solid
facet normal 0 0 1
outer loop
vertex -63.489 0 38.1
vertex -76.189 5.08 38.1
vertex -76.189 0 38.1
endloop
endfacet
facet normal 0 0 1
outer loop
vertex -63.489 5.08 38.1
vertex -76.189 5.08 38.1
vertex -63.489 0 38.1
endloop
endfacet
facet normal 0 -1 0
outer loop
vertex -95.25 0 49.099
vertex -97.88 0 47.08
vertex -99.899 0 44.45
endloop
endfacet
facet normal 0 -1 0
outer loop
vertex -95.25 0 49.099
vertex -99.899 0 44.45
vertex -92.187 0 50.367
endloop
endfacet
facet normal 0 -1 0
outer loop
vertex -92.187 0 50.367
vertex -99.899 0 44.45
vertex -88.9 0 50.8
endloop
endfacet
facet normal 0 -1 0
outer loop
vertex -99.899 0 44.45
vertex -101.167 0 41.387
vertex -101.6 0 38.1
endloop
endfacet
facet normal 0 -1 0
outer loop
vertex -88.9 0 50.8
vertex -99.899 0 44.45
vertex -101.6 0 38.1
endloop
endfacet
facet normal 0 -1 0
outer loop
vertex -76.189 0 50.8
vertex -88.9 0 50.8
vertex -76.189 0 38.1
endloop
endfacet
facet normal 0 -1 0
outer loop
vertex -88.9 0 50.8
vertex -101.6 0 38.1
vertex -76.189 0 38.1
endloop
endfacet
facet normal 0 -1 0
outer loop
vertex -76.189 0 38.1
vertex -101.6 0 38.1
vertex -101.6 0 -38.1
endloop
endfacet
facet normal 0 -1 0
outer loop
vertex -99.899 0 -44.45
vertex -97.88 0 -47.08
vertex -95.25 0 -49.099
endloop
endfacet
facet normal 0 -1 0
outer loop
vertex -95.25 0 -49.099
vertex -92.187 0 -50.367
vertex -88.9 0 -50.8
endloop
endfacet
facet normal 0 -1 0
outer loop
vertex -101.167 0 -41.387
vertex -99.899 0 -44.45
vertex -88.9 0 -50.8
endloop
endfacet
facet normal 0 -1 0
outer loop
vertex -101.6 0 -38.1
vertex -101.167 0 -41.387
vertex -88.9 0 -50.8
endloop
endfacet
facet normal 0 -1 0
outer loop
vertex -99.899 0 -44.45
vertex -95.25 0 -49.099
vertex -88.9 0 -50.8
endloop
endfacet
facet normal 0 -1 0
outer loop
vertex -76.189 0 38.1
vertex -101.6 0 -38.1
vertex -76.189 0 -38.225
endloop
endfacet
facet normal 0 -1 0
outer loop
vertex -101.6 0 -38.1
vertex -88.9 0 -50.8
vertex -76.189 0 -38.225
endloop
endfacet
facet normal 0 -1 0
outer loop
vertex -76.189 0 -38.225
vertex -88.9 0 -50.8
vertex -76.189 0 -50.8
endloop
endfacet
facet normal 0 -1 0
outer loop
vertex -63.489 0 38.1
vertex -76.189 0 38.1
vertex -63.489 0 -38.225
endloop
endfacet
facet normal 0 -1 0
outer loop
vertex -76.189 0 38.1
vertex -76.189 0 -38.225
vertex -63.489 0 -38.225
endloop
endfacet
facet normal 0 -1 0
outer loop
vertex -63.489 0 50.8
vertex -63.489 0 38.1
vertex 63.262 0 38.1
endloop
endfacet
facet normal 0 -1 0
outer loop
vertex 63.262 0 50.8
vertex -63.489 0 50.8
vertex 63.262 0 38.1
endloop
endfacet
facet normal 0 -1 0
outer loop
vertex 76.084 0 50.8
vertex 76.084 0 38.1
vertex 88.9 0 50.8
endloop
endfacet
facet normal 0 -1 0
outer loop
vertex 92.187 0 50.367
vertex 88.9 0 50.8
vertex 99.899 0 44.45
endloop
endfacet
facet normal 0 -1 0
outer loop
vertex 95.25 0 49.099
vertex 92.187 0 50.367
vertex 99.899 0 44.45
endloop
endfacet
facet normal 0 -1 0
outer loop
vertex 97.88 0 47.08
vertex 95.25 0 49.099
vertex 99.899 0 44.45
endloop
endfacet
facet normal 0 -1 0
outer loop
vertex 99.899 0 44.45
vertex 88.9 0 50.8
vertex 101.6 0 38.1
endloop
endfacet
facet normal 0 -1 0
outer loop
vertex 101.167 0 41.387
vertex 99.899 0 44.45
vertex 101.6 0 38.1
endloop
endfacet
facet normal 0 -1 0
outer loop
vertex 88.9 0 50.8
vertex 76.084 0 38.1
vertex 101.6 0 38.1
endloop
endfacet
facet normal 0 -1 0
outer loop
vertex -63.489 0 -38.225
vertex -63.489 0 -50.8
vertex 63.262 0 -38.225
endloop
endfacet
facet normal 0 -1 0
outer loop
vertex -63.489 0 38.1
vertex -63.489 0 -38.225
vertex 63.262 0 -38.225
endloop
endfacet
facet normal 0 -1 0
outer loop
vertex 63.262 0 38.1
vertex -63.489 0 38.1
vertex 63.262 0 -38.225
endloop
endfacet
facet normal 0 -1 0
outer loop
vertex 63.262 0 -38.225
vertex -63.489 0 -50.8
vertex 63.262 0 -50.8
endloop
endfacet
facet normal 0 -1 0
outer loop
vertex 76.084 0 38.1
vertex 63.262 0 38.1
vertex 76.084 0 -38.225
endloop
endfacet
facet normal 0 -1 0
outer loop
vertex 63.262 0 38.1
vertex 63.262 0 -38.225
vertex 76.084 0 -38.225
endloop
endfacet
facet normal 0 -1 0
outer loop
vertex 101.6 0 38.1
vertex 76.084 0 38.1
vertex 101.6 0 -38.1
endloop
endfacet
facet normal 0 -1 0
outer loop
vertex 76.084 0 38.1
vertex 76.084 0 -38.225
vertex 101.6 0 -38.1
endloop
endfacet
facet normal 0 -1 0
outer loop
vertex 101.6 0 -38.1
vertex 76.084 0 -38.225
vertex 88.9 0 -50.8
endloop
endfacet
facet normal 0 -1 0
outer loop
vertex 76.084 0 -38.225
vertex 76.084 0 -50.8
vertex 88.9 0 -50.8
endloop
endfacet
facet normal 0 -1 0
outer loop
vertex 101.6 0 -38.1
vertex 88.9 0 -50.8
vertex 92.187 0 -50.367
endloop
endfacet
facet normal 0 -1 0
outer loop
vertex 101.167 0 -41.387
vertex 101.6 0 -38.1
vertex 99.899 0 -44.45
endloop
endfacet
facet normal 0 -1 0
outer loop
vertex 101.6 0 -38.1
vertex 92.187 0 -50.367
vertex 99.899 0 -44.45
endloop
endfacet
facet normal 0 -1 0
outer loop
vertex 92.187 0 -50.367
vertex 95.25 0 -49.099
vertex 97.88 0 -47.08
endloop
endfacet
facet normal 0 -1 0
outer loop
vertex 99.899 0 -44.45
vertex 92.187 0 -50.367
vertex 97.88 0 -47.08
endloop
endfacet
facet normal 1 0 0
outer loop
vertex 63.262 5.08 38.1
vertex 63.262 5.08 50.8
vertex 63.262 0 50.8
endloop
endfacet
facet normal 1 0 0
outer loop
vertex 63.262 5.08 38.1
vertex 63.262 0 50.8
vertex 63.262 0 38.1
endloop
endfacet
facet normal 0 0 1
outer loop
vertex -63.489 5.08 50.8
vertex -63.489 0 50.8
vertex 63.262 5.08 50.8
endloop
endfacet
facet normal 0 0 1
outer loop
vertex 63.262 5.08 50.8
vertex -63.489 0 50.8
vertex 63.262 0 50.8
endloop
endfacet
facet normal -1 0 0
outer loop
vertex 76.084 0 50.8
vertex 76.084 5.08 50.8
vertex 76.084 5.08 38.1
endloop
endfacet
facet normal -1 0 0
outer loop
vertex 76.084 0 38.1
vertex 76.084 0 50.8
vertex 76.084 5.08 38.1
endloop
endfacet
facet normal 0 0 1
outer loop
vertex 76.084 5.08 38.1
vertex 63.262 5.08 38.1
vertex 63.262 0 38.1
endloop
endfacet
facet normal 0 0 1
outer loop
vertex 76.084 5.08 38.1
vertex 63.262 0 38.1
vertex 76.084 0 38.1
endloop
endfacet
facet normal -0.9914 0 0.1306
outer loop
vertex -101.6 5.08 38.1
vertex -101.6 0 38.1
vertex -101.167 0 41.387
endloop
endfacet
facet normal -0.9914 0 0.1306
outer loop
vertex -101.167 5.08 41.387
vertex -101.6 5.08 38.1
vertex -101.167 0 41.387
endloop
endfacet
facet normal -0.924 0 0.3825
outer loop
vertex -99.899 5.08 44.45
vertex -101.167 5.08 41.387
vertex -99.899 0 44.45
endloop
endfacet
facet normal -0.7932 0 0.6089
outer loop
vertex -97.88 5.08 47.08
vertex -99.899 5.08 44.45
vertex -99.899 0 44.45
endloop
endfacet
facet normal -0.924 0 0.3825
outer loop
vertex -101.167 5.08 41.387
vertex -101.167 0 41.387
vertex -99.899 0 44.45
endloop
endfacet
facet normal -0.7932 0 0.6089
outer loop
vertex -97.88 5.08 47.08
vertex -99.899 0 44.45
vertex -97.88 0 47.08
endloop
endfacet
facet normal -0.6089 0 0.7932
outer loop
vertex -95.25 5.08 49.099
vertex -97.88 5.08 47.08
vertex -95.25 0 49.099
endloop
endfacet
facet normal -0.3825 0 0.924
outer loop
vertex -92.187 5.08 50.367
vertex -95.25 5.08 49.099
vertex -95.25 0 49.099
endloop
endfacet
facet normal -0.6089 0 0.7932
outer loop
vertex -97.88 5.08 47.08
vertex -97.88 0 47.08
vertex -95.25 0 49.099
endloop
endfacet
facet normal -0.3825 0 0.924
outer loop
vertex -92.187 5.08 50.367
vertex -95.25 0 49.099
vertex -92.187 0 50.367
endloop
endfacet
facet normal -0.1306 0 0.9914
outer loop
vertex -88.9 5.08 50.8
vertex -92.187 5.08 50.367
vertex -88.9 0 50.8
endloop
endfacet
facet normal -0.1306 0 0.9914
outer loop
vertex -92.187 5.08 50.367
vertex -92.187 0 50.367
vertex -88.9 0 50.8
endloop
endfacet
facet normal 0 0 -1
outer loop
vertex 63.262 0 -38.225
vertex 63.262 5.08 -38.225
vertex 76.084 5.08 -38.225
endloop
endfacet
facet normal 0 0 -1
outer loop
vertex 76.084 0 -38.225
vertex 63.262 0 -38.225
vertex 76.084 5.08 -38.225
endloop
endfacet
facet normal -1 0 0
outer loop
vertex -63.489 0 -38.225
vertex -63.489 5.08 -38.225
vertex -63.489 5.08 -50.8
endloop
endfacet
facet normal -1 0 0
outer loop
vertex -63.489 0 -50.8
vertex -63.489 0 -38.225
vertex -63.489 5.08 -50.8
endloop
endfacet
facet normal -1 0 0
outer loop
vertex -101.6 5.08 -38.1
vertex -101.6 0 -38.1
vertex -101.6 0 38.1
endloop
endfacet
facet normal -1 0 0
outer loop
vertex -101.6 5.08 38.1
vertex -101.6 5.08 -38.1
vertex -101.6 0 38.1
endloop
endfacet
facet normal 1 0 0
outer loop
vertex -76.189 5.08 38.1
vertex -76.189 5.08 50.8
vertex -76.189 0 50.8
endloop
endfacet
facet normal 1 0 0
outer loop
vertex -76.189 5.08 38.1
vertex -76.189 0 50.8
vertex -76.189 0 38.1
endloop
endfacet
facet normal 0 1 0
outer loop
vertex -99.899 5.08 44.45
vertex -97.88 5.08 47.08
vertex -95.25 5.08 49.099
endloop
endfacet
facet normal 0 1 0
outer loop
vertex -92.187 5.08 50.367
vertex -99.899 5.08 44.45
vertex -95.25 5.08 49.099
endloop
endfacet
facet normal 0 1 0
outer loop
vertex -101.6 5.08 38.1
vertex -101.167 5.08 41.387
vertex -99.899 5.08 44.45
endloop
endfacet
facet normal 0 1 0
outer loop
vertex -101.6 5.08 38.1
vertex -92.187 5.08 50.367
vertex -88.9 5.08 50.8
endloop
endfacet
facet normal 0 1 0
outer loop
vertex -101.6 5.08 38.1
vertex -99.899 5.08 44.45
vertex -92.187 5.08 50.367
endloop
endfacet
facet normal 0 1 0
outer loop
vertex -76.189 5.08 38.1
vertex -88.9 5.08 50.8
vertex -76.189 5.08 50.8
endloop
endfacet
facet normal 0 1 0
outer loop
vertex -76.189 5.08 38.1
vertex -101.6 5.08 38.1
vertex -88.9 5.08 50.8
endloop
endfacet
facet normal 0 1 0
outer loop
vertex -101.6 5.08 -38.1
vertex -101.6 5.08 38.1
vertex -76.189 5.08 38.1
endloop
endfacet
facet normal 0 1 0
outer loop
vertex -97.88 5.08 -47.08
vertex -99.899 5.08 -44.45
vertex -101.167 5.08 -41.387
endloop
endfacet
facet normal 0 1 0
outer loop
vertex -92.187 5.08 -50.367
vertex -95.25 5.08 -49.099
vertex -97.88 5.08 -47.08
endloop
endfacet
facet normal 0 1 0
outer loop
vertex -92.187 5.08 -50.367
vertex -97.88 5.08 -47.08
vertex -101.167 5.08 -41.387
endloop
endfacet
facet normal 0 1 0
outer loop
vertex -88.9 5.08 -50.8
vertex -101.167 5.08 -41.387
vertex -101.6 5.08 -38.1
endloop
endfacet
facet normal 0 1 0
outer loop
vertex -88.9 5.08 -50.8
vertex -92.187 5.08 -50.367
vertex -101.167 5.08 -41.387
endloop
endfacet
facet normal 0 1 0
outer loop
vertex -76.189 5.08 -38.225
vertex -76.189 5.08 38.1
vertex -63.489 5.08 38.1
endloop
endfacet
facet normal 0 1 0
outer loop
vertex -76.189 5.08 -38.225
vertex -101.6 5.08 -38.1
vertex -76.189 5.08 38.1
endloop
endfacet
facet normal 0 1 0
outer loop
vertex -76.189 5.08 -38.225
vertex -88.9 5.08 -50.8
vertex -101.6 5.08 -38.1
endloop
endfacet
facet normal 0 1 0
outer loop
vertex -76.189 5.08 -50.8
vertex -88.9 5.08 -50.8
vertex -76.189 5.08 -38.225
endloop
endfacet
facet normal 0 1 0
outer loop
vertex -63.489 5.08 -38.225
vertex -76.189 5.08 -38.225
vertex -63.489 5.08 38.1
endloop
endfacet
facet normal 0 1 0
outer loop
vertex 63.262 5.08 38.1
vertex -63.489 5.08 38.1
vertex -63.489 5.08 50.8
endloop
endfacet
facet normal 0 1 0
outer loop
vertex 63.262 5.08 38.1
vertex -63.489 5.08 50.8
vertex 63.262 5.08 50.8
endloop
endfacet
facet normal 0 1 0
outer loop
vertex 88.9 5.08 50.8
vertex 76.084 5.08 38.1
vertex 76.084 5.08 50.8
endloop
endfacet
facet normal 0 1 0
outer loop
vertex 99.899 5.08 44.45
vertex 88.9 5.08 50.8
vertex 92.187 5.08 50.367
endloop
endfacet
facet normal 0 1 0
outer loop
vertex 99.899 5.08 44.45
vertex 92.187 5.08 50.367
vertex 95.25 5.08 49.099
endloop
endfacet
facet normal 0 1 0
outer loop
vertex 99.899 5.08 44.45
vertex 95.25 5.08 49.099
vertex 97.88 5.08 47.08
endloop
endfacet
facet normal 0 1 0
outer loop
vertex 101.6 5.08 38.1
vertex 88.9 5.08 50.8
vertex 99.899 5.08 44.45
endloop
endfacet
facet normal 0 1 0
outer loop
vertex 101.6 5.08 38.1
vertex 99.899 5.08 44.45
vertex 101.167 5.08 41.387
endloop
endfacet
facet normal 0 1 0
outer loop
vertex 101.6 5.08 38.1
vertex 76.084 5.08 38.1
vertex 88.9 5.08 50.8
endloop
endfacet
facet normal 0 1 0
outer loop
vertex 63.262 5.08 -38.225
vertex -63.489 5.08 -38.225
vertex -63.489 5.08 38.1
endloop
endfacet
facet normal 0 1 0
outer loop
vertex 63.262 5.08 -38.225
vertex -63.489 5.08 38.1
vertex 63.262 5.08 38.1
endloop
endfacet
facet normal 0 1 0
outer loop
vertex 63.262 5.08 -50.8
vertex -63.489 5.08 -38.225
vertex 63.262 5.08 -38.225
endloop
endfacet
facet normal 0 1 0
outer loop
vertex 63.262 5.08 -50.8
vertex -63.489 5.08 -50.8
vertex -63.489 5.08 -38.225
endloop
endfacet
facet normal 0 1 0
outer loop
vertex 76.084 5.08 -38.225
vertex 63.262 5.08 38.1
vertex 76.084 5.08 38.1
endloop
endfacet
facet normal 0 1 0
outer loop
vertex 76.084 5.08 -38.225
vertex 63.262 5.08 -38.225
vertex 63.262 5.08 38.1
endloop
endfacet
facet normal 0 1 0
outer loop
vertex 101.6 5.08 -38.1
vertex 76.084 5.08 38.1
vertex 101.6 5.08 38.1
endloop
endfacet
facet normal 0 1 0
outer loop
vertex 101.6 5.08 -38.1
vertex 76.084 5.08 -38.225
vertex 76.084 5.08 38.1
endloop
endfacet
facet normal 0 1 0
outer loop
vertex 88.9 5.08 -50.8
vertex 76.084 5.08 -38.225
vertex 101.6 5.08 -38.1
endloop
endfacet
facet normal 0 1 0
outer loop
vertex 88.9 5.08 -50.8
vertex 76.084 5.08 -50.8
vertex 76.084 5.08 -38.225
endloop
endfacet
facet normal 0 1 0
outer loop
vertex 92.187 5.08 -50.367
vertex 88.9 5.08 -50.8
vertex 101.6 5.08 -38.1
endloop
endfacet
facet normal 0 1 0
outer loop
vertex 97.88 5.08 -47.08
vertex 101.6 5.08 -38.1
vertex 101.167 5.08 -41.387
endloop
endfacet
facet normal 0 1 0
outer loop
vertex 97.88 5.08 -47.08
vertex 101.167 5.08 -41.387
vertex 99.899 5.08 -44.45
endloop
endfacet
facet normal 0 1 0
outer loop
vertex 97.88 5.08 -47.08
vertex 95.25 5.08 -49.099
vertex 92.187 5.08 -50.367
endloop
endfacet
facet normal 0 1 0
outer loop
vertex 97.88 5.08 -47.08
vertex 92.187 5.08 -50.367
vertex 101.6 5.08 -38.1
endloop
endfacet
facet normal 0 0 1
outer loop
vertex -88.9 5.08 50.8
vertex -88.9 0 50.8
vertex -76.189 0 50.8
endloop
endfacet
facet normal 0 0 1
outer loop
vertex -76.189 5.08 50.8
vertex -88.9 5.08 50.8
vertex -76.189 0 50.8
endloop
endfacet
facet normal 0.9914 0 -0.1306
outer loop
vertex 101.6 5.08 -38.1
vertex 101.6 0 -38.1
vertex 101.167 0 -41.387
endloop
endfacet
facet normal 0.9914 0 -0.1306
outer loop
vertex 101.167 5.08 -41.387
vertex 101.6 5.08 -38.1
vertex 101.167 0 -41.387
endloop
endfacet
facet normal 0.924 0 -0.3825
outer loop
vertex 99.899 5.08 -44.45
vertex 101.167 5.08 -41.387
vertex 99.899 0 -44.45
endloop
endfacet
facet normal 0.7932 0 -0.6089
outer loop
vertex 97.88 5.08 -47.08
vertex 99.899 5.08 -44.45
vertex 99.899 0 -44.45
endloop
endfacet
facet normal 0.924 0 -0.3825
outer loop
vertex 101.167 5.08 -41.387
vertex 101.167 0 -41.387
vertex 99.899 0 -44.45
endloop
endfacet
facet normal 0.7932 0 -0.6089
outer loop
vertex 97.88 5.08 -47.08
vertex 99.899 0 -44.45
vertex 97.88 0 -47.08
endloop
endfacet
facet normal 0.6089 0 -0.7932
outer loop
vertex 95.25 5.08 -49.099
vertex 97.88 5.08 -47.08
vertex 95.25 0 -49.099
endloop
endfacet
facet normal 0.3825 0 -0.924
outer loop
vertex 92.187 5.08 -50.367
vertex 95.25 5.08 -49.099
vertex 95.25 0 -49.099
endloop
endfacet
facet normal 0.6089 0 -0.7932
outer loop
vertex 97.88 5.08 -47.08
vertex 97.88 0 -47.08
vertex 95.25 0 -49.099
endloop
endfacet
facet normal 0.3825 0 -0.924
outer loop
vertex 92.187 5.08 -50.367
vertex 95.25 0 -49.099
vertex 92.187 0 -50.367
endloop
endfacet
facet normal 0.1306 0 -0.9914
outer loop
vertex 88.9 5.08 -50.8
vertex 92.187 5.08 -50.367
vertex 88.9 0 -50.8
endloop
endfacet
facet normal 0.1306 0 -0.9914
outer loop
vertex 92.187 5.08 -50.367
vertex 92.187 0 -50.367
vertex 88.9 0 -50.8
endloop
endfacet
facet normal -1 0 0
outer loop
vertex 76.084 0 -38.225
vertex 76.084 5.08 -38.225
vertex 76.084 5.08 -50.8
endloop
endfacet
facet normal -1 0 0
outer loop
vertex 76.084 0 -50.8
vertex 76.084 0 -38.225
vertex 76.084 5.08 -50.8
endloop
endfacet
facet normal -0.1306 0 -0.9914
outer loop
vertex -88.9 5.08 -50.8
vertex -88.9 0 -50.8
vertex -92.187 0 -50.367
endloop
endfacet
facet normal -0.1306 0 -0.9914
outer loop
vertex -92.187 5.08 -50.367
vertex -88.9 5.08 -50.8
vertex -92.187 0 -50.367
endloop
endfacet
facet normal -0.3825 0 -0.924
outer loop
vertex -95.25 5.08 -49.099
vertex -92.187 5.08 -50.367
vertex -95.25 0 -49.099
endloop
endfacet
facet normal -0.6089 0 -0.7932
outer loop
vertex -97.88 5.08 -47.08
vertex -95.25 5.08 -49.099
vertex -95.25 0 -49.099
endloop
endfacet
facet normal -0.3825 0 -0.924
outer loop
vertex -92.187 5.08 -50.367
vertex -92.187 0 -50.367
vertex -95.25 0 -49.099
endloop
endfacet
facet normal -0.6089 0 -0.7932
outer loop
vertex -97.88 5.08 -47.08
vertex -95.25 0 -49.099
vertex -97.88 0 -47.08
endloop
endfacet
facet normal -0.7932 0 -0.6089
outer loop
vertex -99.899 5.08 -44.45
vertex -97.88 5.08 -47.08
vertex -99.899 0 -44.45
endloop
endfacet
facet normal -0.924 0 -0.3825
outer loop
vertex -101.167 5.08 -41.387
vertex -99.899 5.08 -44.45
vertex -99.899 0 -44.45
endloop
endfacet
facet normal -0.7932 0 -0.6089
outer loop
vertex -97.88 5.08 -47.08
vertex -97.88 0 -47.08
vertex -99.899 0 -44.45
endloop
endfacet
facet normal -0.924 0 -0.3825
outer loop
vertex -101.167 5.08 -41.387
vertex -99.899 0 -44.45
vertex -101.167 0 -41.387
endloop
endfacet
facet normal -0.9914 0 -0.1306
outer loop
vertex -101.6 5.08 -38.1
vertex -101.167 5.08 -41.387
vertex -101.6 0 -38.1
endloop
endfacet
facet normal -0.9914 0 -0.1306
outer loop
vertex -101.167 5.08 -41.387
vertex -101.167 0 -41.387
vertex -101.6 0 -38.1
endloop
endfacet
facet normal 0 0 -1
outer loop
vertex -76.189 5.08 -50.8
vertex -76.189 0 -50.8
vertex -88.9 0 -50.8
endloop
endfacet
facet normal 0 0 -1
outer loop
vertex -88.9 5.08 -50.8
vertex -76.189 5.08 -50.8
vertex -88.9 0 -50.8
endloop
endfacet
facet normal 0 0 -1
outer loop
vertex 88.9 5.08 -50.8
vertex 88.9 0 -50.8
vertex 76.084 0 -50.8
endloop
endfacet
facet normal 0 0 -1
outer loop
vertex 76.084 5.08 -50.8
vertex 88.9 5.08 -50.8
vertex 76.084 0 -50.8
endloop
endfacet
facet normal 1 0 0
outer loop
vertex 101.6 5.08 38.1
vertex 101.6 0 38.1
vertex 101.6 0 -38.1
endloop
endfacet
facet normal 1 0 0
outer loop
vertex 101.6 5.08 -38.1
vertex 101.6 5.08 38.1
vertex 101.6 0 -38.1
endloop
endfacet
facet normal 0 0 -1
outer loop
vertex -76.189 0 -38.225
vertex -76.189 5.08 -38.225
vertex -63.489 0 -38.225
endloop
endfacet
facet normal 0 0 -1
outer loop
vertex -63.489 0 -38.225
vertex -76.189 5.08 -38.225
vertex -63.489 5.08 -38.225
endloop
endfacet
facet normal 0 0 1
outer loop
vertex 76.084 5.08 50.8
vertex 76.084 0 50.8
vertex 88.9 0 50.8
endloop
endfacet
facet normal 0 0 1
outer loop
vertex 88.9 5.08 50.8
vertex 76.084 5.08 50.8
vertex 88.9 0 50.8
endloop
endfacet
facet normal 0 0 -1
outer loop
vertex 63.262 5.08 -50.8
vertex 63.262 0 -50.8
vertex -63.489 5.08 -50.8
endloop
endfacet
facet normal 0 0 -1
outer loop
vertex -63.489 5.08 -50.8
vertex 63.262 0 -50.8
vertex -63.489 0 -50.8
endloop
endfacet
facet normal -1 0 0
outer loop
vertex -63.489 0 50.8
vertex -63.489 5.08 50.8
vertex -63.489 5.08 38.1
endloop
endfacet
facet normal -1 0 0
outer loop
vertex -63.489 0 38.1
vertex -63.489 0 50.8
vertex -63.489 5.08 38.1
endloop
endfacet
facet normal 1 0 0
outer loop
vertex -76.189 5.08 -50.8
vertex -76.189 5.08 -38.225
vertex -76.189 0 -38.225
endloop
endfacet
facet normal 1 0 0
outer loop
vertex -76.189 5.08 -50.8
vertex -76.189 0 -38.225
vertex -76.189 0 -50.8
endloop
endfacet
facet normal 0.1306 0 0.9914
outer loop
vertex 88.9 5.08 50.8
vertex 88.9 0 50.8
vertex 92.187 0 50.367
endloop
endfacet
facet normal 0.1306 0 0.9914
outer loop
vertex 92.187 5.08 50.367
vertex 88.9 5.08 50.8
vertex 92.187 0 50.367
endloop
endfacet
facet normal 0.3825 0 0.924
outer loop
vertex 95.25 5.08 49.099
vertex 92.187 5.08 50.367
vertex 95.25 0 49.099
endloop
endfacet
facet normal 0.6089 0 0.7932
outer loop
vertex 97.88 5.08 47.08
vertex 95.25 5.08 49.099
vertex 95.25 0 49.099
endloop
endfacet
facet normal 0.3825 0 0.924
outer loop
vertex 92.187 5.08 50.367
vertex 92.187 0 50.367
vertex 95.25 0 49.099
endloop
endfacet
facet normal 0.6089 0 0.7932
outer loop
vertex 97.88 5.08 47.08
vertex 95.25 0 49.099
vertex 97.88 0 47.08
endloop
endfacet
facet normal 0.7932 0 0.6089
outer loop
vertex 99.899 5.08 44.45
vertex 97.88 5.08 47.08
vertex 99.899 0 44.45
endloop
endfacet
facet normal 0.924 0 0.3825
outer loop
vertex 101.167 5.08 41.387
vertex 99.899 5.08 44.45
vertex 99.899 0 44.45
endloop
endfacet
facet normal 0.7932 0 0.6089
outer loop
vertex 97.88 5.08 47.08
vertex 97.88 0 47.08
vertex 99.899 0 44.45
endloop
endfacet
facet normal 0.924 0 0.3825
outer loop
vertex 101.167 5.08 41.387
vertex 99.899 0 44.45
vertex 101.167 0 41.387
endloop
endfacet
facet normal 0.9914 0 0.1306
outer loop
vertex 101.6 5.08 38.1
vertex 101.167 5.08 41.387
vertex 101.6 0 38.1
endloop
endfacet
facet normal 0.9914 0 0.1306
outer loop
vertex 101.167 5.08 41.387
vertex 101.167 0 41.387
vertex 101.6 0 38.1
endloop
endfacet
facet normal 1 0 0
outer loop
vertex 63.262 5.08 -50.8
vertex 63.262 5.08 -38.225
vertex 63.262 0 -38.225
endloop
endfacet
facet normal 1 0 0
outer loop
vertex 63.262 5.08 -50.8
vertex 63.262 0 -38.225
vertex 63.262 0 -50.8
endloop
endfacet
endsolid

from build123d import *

# Parameters (mm, degrees)
BOSS_EXTRUDE1_DEPTH = 5.08
SKETCH3_W           = 12.7
SKETCH3_H           = 12.7
SKETCH3_H_2         = 12.575411903
SKETCH3_W_2         = 12.822150439
CUT_EXTRUDE1_DEPTH  = 114.705788771


with BuildPart() as part:
    # Sketch2 → Boss-Extrude1 (new body)
    with BuildSketch(Plane(origin=(0, 0, 0), x_dir=(1, 0, 0), z_dir=(0, 1, 0))):
        with BuildLine():
            Line((-88.9, -50.8), (88.9, -50.8))
            ThreePointArc((88.9, -50.8), (97.880256121, -47.080256121), (101.6, -38.1))
            Line((101.6, -38.1), (101.6, 38.1))
            ThreePointArc((101.6, 38.1), (97.880256121, 47.080256121), (88.9, 50.8))
            Line((88.9, 50.8), (-88.9, 50.8))
            ThreePointArc((-88.9, 50.8), (-97.880256121, 47.080256121), (-101.6, 38.1))
            Line((-101.6, 38.1), (-101.6, -38.1))
            ThreePointArc((-101.6, -38.1), (-97.880256121, -47.080256121), (-88.9, -50.8))
        make_face()
    extrude(amount=BOSS_EXTRUDE1_DEPTH)

    # Sketch3 → Cut-Extrude1 (cut, through all)
    with BuildSketch(Plane(origin=(0, 5.08, 0), x_dir=(1, 0, 0), z_dir=(0, 1, 0))):
        with Locations((-69.838651623, -44.45)):
            Rectangle(SKETCH3_W, SKETCH3_H)
        with Locations((-69.838651623, 44.512294049)):
            Rectangle(SKETCH3_W, SKETCH3_H_2)
        with Locations((69.673417763, -44.45)):
            Rectangle(SKETCH3_W_2, SKETCH3_H)
        with Locations((69.673417763, 44.512294049)):
            Rectangle(SKETCH3_W_2, SKETCH3_H_2)
    extrude(amount=-CUT_EXTRUDE1_DEPTH, mode=Mode.SUBTRACT)


solid = part.part
